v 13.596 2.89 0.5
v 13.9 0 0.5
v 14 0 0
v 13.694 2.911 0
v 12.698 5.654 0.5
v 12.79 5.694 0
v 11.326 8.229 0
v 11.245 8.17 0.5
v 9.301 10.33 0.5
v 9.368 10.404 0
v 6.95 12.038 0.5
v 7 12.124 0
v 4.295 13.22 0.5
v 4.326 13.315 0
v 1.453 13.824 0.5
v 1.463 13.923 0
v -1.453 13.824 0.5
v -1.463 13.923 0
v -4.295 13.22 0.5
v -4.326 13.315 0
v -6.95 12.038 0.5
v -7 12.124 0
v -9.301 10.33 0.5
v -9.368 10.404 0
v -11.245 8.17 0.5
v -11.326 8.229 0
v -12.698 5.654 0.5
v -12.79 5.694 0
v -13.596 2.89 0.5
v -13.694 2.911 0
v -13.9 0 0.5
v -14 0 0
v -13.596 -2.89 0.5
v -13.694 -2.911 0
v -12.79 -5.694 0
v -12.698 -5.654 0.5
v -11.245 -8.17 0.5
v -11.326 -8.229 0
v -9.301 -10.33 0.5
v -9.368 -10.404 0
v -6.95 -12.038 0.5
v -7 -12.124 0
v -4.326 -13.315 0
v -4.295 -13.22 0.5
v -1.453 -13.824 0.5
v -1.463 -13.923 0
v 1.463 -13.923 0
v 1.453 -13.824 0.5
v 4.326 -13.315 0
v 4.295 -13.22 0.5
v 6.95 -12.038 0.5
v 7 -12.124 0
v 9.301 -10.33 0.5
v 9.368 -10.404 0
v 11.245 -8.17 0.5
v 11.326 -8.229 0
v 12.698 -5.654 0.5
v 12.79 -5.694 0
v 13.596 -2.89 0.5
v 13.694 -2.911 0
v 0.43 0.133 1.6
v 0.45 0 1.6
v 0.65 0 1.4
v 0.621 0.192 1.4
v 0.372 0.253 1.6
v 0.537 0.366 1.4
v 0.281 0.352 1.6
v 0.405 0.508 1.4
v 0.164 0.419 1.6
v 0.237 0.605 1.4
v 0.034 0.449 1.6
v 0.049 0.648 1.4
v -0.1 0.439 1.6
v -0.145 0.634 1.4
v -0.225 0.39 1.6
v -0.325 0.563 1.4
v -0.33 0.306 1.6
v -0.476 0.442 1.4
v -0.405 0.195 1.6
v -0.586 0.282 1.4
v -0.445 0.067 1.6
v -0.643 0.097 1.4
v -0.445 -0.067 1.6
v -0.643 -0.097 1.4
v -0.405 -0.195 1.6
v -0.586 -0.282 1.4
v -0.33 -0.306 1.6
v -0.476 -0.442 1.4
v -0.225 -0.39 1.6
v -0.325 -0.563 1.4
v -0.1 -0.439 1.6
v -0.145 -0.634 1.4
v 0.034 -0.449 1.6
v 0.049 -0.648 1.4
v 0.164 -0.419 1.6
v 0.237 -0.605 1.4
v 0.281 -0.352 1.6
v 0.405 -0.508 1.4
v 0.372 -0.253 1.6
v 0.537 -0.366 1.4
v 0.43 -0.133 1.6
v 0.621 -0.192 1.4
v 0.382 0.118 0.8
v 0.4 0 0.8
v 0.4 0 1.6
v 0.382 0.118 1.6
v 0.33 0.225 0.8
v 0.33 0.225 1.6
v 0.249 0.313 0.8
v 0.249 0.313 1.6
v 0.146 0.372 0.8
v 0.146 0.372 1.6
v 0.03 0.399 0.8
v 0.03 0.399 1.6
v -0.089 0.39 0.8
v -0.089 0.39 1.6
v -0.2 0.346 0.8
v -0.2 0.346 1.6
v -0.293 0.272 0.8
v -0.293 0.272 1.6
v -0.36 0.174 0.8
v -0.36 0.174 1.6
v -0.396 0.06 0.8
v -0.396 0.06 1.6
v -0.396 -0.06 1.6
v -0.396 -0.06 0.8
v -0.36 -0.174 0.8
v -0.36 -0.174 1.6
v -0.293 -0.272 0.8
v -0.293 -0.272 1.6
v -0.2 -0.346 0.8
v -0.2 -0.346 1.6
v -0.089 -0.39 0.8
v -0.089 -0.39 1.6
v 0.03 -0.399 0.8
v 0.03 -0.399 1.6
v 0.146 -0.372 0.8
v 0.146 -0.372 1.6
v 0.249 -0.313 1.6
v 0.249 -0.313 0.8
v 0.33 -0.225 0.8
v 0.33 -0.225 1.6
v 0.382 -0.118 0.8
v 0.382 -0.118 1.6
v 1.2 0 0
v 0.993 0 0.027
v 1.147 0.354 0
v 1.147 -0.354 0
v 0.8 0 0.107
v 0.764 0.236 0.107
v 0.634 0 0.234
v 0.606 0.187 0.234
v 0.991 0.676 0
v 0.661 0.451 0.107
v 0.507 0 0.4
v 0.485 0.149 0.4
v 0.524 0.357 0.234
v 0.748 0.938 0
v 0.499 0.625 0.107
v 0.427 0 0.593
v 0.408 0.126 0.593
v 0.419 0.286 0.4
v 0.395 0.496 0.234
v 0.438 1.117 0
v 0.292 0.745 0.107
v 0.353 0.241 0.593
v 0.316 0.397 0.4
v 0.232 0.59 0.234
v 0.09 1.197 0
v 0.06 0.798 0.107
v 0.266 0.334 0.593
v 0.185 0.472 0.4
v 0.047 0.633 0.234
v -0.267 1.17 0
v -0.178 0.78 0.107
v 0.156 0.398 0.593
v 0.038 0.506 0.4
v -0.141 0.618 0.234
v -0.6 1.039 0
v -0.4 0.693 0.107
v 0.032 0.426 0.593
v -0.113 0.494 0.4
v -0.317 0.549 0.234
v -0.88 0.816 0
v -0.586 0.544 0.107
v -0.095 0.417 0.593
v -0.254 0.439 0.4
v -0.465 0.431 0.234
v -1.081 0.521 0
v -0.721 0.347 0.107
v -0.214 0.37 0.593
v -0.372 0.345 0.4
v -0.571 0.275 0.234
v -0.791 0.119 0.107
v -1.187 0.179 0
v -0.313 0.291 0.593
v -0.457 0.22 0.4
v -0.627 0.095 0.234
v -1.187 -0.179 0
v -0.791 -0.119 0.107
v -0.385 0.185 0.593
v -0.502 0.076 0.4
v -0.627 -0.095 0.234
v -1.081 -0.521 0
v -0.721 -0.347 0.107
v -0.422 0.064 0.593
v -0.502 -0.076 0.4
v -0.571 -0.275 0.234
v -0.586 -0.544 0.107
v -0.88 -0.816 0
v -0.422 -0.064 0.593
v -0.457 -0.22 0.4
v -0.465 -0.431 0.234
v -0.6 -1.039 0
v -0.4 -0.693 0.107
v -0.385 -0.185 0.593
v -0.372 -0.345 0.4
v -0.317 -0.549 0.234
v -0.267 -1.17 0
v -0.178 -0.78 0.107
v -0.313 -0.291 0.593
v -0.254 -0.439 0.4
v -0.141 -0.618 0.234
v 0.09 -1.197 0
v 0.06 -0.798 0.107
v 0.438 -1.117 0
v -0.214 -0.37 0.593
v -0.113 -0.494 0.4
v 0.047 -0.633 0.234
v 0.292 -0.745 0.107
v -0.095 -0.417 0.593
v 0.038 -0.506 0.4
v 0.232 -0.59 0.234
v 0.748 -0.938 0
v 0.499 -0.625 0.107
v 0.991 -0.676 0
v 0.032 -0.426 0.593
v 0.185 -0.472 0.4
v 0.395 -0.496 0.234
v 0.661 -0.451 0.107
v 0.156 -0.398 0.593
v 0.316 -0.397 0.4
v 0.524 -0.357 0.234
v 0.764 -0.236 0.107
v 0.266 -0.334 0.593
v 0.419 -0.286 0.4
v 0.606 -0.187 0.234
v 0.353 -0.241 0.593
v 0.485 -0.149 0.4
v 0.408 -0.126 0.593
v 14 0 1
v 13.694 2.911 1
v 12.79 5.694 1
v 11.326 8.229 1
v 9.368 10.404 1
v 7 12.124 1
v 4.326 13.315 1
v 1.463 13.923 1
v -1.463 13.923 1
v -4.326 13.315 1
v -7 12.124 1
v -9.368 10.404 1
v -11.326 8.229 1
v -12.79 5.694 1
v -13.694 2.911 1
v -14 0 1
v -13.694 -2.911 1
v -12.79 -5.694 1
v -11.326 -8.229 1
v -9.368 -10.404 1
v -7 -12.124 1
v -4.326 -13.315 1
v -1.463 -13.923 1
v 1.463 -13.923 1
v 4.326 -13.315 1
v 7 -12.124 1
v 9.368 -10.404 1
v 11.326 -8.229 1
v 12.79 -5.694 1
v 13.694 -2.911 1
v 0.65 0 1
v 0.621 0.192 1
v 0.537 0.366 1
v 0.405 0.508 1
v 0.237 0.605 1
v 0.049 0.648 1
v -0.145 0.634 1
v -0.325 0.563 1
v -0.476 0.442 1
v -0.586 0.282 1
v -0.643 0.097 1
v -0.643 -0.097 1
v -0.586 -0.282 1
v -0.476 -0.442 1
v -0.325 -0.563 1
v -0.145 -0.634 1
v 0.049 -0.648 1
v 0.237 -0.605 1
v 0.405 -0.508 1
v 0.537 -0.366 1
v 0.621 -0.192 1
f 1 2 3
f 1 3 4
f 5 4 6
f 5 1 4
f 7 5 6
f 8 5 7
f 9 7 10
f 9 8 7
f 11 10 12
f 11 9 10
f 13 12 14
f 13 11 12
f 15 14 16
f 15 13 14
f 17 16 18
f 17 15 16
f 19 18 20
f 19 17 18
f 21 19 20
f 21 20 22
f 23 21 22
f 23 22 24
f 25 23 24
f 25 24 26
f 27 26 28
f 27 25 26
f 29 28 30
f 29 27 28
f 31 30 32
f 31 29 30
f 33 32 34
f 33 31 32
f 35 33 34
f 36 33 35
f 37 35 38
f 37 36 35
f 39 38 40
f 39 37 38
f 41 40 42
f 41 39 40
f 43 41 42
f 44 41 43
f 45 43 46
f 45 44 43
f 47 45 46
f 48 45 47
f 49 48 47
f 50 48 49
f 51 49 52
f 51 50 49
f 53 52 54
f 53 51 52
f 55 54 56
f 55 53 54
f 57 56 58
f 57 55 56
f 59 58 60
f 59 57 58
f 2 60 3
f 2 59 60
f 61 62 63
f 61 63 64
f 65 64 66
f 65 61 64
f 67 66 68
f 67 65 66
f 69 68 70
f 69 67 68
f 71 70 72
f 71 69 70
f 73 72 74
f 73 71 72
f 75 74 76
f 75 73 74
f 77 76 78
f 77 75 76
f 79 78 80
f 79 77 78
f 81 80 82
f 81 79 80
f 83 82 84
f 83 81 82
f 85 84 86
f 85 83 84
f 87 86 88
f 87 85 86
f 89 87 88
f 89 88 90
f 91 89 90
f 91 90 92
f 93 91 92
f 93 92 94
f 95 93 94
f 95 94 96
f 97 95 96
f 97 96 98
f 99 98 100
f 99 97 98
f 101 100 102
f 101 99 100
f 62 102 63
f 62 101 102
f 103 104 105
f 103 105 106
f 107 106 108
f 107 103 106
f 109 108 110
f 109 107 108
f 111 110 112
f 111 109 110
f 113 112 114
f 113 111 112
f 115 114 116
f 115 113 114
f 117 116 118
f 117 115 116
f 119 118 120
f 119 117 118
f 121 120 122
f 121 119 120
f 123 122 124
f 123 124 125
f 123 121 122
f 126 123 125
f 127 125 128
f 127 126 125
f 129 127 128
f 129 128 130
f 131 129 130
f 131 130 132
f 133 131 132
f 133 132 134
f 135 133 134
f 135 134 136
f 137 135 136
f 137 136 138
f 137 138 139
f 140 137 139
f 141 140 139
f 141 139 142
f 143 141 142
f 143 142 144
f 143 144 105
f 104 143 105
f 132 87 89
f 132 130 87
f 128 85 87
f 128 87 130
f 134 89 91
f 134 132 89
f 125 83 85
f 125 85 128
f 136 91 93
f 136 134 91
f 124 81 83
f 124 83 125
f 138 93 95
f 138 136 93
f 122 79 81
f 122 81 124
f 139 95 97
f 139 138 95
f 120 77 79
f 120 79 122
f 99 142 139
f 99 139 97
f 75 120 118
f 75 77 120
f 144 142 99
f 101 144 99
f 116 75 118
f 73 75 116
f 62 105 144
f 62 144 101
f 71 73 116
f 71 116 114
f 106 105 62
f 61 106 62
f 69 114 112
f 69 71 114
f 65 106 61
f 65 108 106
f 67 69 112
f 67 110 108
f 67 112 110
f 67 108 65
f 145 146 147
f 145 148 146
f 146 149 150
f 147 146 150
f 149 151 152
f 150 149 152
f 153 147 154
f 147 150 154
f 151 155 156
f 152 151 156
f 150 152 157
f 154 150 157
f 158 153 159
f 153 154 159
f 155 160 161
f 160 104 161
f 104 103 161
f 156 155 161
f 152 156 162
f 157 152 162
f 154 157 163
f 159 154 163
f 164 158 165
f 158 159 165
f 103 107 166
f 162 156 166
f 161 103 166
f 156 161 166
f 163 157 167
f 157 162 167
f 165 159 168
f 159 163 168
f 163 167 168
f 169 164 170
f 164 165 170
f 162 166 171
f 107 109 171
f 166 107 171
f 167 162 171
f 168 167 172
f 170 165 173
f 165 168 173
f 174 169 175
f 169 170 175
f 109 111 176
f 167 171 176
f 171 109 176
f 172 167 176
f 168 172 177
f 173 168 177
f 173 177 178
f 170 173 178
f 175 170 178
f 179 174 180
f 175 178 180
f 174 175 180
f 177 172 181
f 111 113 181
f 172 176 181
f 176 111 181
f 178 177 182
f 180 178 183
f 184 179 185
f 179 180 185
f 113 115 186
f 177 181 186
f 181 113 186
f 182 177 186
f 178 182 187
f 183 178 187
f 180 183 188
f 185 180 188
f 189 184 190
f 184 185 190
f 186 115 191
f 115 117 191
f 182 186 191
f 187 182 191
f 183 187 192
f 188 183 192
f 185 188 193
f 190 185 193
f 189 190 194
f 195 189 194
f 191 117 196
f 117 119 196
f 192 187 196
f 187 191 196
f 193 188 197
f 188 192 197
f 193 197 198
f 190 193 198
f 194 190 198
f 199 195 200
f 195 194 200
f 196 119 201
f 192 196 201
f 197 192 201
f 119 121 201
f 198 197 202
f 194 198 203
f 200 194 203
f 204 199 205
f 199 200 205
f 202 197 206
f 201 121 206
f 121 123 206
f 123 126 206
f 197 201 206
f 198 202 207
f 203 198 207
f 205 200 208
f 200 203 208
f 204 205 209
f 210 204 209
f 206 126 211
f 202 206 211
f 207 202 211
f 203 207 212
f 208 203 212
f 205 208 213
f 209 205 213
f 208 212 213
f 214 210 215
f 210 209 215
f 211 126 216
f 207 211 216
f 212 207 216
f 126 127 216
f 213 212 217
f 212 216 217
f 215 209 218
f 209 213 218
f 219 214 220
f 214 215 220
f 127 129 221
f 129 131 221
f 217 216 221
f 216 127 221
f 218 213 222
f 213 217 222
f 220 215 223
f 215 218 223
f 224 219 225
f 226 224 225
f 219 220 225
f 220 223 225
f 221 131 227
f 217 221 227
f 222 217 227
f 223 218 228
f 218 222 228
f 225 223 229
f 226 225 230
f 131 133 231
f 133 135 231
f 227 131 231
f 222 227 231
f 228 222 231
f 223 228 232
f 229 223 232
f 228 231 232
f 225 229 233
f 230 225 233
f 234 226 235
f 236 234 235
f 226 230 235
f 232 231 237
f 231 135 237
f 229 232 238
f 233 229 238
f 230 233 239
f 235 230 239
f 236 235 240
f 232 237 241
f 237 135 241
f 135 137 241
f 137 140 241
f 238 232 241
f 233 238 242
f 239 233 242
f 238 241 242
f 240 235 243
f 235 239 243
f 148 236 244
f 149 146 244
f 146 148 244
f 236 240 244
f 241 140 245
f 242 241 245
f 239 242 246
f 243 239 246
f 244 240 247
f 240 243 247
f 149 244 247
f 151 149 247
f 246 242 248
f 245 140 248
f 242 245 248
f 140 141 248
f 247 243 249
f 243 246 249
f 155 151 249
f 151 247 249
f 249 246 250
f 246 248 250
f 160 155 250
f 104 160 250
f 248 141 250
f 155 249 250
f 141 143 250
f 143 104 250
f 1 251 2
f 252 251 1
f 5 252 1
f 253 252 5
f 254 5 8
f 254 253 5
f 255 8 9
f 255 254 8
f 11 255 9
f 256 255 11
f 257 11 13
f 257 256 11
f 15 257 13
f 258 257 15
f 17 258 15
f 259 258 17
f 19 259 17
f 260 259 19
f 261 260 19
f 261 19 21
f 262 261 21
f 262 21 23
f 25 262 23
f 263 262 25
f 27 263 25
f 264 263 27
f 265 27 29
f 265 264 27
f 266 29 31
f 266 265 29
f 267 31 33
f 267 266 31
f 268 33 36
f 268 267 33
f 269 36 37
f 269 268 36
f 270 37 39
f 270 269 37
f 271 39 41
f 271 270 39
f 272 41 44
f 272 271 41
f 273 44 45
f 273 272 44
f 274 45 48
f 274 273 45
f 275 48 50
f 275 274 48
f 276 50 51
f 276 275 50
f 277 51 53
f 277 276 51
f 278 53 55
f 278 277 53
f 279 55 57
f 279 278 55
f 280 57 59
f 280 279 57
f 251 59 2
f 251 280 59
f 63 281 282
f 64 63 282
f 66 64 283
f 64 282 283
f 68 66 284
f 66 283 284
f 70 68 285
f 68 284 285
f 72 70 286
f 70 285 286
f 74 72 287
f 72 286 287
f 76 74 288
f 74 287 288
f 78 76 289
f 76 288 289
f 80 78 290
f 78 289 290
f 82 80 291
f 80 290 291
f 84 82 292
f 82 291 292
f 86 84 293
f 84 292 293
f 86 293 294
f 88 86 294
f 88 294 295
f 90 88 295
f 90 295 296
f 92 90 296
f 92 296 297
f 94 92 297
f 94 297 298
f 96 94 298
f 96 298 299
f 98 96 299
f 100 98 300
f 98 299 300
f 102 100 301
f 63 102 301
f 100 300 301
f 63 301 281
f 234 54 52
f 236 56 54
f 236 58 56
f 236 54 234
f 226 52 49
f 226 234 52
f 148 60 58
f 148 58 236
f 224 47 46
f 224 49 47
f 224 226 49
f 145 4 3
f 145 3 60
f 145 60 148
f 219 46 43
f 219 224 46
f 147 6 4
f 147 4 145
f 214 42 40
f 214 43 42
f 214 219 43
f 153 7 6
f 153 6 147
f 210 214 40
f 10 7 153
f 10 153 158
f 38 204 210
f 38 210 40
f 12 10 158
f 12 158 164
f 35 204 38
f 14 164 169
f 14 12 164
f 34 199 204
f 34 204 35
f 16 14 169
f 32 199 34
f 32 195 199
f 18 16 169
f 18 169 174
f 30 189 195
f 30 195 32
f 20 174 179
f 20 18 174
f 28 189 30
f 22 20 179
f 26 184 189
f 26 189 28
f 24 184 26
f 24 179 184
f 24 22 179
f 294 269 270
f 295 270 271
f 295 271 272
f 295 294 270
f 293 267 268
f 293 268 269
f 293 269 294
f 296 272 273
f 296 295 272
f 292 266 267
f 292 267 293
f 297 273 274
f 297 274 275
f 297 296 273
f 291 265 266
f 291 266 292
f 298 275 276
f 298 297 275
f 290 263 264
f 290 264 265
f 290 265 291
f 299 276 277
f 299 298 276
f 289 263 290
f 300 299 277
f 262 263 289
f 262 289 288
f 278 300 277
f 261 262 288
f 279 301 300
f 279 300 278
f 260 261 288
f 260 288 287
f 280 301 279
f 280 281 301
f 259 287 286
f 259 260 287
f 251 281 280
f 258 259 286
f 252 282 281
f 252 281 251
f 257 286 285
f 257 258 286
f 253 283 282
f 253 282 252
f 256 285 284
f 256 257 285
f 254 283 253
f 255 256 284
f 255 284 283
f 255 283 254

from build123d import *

# Parameters (mm, degrees)
CYLINDER_R        = 0.4
CYLINDER_DEPTH    = 1
FILLET_R          = 0.8
CYLINDER002_R     = 0.4
CYLINDER002_DEPTH = 0.6
CYLINDER001_R     = 0.65
CYLINDER001_DEPTH = 0.6
CHAMFER_SIZE      = 0.2


with BuildPart() as cylinder:
    # Cylinder → Cylinder (new body)
    with BuildSketch(Plane.XY):
        Circle(CYLINDER_R)
    extrude(amount=CYLINDER_DEPTH)


with BuildPart() as cone001:
    # Cone001 → Cone001 (revolve)
    with BuildSketch(Plane.XZ):
        Polygon((0, 0), (14, 0), (13.8, 1), (0, 1), align=None)
    revolve(axis=Axis((0, 0, 0), (0, 0, 1)))


with BuildPart() as fillet_body:
    # Cone → Cone (revolve)
    with BuildSketch(Plane.XZ):
        Polygon((0, 0), (13.8, 0), (14, 1), (0, 1), align=None)
    revolve(axis=Axis((0, 0, 0), (0, 0, 1)))

    # Fusion: union Cone001
    add(cone001.part)

    # Cut: cut Cylinder
    add(cylinder.part, mode=Mode.SUBTRACT)

    # Fillet
    fillet_edges = [fillet_body.edges().sort_by_distance(p)[0] for p in [
        (-0.4, 0, 0),
    ]]
    fillet(fillet_edges, radius=FILLET_R)


with BuildPart() as cylinder002:
    # Cylinder002 → Cylinder002 (new body)
    with BuildSketch(Plane.XY.offset(1)):
        Circle(CYLINDER002_R)
    extrude(amount=CYLINDER002_DEPTH)


with BuildPart() as fusion001:
    # Cylinder001 → Cylinder001 (new body)
    with BuildSketch(Plane.XY.offset(1)):
        Circle(CYLINDER001_R)
    extrude(amount=CYLINDER001_DEPTH)

    # Cut001: cut Cylinder002
    add(cylinder002.part, mode=Mode.SUBTRACT)

    # Chamfer
    chamfer_edges = [fusion001.edges().sort_by_distance(p)[0] for p in [
        (-0.65, 0, 1.6),
    ]]
    chamfer(chamfer_edges, length=CHAMFER_SIZE)

    # Fusion001: union Fillet body
    add(fillet_body.part)


solid = fusion001.part
